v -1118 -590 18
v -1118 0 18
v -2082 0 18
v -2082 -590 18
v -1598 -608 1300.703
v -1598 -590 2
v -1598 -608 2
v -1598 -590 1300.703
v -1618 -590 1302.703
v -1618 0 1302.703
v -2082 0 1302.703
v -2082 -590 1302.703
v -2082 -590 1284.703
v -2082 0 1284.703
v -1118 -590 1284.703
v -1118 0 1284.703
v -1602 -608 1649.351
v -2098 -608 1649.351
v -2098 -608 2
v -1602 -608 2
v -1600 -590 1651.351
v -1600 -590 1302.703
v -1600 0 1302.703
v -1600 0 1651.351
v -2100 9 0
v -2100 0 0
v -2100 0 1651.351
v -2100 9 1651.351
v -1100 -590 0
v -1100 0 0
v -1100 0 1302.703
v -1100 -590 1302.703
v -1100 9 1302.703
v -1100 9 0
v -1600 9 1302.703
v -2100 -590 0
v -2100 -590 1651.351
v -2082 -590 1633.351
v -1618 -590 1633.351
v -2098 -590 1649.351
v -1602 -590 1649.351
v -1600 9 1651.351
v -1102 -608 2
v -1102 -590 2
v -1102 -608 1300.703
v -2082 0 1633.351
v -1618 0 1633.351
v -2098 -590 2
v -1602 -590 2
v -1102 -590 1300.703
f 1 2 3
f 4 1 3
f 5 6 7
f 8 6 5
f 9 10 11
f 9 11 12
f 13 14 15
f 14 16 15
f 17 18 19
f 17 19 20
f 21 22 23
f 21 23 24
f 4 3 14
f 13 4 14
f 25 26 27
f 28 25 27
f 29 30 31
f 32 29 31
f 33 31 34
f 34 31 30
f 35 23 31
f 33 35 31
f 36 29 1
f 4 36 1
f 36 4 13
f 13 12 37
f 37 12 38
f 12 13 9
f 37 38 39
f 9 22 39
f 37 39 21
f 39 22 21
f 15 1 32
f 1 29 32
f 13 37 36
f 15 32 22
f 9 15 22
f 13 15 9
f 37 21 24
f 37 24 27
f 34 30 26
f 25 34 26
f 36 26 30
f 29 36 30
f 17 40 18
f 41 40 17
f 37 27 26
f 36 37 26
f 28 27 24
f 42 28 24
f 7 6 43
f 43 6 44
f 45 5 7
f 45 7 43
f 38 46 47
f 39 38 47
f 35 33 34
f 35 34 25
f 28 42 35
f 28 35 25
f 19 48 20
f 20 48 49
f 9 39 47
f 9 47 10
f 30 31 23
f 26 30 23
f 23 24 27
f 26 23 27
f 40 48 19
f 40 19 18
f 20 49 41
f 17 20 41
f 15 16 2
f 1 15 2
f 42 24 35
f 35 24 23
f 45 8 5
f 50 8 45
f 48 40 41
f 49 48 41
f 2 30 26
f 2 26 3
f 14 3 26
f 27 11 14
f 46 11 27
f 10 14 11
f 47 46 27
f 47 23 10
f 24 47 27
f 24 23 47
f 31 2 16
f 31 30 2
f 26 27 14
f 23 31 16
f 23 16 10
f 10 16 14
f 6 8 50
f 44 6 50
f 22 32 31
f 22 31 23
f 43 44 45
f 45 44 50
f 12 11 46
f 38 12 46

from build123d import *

# Parameters (mm, degrees)
F1_DEPTH = 590
F2_W     = 590
F2_H     = 18
F3_DEPTH = 464
F5_DEPTH = 9
F6_W     = 496
F6_H     = 1647.351351
F7_DEPTH = 18
F8_W     = 496
F8_H     = 1298.702703
F9_DEPTH = 18


with BuildPart() as f1:
    # F0 (on Front) → F1 (new body)
    with BuildSketch(Plane.XZ):
        Polygon((-2100, 1651.351351), (-2100, 0), (-1100, 0), (-1100, 1302.702703), (-1600, 1302.702703), (-1600, 1651.351351), align=None)
        Polygon((-1618, 1633.351351), (-1618, 1284.702703), (-1118, 1284.702703), (-1118, 18), (-2082, 18), (-2082, 1633.351351), align=None, mode=Mode.SUBTRACT)
    extrude(amount=F1_DEPTH)

    # F2 (on face) → F3 (join, through all)
    with BuildSketch(Plane(origin=(-1618, 0, 0), x_dir=(0, -1, 0), z_dir=(-1, 0, 0))):
        with Locations((295, 1293.702703)):
            Rectangle(F2_W, F2_H)
    extrude(amount=F3_DEPTH)


with BuildPart() as f5:
    # F4 (on face) → F5 (new body)
    with BuildSketch(Plane(origin=(0, 0, 0), x_dir=(-1, 0, 0), z_dir=(0, 1, 0))):
        Polygon((1100, 1302.702703), (1100, 0), (2100, 0), (2100, 1651.351351), (1600, 1651.351351), (1600, 1302.702703), align=None)
    extrude(amount=F5_DEPTH)


with BuildPart() as f7:
    # F6 (on face) → F7 (new body)
    with BuildSketch(Plane.XZ.offset(590)):
        with Locations((-1850, 825.675676)):
            Rectangle(F6_W, F6_H)
    extrude(amount=F7_DEPTH)


with BuildPart() as f9:
    # F8 (on face) → F9 (new body)
    with BuildSketch(Plane.XZ.offset(590)):
        with Locations((-1350, 651.351351)):
            Rectangle(F8_W, F8_H)
    extrude(amount=F9_DEPTH)


solid = Compound([f1.part, f5.part, f7.part, f9.part])
